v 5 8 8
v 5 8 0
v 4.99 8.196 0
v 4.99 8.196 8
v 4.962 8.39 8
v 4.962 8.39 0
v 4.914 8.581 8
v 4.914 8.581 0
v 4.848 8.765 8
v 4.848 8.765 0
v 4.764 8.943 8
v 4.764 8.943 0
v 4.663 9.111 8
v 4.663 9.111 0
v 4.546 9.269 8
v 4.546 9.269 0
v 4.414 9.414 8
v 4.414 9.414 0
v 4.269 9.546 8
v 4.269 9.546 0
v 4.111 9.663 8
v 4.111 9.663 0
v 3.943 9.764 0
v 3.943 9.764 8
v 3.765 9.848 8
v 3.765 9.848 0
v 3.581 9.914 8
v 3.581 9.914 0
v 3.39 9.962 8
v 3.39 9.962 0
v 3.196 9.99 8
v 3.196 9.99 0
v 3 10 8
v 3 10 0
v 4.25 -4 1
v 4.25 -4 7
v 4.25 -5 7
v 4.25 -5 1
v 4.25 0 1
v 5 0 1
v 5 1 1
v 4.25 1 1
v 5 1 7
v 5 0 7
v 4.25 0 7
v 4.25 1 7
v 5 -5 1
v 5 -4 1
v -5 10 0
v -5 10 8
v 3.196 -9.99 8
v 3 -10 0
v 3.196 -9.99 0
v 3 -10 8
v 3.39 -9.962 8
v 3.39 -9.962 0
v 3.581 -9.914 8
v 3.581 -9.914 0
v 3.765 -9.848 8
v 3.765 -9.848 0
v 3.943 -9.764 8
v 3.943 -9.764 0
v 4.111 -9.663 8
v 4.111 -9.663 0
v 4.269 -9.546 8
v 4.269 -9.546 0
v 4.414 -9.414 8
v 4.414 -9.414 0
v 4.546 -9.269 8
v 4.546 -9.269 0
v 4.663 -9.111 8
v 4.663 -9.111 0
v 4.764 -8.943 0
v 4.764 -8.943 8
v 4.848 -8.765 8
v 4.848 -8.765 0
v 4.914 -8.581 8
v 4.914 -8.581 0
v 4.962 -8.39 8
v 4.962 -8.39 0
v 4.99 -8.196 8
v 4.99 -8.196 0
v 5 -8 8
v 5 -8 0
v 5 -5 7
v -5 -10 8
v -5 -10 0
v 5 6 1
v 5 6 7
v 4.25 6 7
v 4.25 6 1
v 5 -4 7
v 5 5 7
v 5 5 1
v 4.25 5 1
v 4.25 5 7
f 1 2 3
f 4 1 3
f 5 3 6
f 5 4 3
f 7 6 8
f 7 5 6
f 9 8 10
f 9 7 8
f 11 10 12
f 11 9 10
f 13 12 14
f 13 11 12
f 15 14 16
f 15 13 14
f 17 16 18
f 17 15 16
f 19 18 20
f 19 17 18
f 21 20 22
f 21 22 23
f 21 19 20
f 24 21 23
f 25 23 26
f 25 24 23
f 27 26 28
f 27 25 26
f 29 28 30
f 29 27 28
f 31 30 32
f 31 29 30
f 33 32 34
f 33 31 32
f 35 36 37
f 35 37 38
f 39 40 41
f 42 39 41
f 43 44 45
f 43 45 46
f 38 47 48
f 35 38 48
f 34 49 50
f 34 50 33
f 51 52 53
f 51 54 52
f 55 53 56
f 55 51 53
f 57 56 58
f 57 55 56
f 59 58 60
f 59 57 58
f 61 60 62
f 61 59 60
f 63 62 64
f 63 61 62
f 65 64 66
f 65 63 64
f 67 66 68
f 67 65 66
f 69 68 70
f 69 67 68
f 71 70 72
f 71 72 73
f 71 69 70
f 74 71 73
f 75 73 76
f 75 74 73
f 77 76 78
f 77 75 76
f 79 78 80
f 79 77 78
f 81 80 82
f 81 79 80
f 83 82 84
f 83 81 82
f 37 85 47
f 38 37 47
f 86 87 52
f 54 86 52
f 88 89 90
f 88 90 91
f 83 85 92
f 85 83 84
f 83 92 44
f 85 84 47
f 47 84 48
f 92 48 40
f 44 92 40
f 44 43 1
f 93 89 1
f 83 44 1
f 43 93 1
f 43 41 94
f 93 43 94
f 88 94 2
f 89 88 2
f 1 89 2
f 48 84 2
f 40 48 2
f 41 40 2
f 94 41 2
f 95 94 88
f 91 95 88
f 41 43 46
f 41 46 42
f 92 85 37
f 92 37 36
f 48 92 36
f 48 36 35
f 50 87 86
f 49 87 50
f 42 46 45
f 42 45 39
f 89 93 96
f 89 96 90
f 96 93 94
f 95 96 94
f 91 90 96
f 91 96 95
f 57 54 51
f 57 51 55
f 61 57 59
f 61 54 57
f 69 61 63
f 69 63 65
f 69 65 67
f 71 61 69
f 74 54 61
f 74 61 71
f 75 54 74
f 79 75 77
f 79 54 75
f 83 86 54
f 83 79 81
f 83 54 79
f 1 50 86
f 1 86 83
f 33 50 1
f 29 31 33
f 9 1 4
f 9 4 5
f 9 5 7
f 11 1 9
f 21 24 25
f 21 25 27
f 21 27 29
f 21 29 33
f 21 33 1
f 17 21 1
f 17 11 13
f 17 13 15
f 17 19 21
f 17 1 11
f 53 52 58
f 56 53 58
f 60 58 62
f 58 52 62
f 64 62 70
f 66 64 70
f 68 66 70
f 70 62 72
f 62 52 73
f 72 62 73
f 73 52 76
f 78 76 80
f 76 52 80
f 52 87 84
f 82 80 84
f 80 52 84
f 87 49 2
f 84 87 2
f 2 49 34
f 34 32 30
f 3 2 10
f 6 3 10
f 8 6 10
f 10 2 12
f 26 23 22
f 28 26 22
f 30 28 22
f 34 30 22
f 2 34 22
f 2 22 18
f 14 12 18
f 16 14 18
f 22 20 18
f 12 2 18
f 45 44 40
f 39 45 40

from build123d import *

# Parameters (mm, degrees)
SKETCH1_W           = 10
SKETCH1_H           = 20
BOSS_EXTRUDE1_DEPTH = 8
FILLET3_R           = 2
SKETCH2_W           = 6
SKETCH2_H           = 1
CUT_EXTRUDE1_DEPTH  = 0.75
LPATTERN1_COUNT     = 3
LPATTERN1_PITCH     = 5


with BuildPart() as part:
    # Sketch1 → Boss-Extrude1 (new body)
    with BuildSketch(Plane.XY):
        Rectangle(SKETCH1_W, SKETCH1_H)
    extrude(amount=BOSS_EXTRUDE1_DEPTH)

    # Fillet3
    fillet3_edges = [part.edges().sort_by_distance(p)[0] for p in [
        (5, 10, 4),
        (5, -10, 4),
    ]]
    fillet(fillet3_edges, radius=FILLET3_R)

    # Sketch2 → Cut-Extrude1 (cut)
    with BuildSketch(Plane(origin=(5, 0, 0), x_dir=(0, 0, -1), z_dir=(1, 0, 0))):
        with Locations((-4, -4.5)):
            Rectangle(SKETCH2_W, SKETCH2_H)
    cut_extrude1 = extrude(amount=-CUT_EXTRUDE1_DEPTH, mode=Mode.SUBTRACT)

    # LPattern1: Cut-Extrude1 ×3
    with Locations(*[(0, i * LPATTERN1_PITCH, 0) for i in range(1, LPATTERN1_COUNT)]):
        add(cut_extrude1, mode=Mode.SUBTRACT)


solid = part.part
